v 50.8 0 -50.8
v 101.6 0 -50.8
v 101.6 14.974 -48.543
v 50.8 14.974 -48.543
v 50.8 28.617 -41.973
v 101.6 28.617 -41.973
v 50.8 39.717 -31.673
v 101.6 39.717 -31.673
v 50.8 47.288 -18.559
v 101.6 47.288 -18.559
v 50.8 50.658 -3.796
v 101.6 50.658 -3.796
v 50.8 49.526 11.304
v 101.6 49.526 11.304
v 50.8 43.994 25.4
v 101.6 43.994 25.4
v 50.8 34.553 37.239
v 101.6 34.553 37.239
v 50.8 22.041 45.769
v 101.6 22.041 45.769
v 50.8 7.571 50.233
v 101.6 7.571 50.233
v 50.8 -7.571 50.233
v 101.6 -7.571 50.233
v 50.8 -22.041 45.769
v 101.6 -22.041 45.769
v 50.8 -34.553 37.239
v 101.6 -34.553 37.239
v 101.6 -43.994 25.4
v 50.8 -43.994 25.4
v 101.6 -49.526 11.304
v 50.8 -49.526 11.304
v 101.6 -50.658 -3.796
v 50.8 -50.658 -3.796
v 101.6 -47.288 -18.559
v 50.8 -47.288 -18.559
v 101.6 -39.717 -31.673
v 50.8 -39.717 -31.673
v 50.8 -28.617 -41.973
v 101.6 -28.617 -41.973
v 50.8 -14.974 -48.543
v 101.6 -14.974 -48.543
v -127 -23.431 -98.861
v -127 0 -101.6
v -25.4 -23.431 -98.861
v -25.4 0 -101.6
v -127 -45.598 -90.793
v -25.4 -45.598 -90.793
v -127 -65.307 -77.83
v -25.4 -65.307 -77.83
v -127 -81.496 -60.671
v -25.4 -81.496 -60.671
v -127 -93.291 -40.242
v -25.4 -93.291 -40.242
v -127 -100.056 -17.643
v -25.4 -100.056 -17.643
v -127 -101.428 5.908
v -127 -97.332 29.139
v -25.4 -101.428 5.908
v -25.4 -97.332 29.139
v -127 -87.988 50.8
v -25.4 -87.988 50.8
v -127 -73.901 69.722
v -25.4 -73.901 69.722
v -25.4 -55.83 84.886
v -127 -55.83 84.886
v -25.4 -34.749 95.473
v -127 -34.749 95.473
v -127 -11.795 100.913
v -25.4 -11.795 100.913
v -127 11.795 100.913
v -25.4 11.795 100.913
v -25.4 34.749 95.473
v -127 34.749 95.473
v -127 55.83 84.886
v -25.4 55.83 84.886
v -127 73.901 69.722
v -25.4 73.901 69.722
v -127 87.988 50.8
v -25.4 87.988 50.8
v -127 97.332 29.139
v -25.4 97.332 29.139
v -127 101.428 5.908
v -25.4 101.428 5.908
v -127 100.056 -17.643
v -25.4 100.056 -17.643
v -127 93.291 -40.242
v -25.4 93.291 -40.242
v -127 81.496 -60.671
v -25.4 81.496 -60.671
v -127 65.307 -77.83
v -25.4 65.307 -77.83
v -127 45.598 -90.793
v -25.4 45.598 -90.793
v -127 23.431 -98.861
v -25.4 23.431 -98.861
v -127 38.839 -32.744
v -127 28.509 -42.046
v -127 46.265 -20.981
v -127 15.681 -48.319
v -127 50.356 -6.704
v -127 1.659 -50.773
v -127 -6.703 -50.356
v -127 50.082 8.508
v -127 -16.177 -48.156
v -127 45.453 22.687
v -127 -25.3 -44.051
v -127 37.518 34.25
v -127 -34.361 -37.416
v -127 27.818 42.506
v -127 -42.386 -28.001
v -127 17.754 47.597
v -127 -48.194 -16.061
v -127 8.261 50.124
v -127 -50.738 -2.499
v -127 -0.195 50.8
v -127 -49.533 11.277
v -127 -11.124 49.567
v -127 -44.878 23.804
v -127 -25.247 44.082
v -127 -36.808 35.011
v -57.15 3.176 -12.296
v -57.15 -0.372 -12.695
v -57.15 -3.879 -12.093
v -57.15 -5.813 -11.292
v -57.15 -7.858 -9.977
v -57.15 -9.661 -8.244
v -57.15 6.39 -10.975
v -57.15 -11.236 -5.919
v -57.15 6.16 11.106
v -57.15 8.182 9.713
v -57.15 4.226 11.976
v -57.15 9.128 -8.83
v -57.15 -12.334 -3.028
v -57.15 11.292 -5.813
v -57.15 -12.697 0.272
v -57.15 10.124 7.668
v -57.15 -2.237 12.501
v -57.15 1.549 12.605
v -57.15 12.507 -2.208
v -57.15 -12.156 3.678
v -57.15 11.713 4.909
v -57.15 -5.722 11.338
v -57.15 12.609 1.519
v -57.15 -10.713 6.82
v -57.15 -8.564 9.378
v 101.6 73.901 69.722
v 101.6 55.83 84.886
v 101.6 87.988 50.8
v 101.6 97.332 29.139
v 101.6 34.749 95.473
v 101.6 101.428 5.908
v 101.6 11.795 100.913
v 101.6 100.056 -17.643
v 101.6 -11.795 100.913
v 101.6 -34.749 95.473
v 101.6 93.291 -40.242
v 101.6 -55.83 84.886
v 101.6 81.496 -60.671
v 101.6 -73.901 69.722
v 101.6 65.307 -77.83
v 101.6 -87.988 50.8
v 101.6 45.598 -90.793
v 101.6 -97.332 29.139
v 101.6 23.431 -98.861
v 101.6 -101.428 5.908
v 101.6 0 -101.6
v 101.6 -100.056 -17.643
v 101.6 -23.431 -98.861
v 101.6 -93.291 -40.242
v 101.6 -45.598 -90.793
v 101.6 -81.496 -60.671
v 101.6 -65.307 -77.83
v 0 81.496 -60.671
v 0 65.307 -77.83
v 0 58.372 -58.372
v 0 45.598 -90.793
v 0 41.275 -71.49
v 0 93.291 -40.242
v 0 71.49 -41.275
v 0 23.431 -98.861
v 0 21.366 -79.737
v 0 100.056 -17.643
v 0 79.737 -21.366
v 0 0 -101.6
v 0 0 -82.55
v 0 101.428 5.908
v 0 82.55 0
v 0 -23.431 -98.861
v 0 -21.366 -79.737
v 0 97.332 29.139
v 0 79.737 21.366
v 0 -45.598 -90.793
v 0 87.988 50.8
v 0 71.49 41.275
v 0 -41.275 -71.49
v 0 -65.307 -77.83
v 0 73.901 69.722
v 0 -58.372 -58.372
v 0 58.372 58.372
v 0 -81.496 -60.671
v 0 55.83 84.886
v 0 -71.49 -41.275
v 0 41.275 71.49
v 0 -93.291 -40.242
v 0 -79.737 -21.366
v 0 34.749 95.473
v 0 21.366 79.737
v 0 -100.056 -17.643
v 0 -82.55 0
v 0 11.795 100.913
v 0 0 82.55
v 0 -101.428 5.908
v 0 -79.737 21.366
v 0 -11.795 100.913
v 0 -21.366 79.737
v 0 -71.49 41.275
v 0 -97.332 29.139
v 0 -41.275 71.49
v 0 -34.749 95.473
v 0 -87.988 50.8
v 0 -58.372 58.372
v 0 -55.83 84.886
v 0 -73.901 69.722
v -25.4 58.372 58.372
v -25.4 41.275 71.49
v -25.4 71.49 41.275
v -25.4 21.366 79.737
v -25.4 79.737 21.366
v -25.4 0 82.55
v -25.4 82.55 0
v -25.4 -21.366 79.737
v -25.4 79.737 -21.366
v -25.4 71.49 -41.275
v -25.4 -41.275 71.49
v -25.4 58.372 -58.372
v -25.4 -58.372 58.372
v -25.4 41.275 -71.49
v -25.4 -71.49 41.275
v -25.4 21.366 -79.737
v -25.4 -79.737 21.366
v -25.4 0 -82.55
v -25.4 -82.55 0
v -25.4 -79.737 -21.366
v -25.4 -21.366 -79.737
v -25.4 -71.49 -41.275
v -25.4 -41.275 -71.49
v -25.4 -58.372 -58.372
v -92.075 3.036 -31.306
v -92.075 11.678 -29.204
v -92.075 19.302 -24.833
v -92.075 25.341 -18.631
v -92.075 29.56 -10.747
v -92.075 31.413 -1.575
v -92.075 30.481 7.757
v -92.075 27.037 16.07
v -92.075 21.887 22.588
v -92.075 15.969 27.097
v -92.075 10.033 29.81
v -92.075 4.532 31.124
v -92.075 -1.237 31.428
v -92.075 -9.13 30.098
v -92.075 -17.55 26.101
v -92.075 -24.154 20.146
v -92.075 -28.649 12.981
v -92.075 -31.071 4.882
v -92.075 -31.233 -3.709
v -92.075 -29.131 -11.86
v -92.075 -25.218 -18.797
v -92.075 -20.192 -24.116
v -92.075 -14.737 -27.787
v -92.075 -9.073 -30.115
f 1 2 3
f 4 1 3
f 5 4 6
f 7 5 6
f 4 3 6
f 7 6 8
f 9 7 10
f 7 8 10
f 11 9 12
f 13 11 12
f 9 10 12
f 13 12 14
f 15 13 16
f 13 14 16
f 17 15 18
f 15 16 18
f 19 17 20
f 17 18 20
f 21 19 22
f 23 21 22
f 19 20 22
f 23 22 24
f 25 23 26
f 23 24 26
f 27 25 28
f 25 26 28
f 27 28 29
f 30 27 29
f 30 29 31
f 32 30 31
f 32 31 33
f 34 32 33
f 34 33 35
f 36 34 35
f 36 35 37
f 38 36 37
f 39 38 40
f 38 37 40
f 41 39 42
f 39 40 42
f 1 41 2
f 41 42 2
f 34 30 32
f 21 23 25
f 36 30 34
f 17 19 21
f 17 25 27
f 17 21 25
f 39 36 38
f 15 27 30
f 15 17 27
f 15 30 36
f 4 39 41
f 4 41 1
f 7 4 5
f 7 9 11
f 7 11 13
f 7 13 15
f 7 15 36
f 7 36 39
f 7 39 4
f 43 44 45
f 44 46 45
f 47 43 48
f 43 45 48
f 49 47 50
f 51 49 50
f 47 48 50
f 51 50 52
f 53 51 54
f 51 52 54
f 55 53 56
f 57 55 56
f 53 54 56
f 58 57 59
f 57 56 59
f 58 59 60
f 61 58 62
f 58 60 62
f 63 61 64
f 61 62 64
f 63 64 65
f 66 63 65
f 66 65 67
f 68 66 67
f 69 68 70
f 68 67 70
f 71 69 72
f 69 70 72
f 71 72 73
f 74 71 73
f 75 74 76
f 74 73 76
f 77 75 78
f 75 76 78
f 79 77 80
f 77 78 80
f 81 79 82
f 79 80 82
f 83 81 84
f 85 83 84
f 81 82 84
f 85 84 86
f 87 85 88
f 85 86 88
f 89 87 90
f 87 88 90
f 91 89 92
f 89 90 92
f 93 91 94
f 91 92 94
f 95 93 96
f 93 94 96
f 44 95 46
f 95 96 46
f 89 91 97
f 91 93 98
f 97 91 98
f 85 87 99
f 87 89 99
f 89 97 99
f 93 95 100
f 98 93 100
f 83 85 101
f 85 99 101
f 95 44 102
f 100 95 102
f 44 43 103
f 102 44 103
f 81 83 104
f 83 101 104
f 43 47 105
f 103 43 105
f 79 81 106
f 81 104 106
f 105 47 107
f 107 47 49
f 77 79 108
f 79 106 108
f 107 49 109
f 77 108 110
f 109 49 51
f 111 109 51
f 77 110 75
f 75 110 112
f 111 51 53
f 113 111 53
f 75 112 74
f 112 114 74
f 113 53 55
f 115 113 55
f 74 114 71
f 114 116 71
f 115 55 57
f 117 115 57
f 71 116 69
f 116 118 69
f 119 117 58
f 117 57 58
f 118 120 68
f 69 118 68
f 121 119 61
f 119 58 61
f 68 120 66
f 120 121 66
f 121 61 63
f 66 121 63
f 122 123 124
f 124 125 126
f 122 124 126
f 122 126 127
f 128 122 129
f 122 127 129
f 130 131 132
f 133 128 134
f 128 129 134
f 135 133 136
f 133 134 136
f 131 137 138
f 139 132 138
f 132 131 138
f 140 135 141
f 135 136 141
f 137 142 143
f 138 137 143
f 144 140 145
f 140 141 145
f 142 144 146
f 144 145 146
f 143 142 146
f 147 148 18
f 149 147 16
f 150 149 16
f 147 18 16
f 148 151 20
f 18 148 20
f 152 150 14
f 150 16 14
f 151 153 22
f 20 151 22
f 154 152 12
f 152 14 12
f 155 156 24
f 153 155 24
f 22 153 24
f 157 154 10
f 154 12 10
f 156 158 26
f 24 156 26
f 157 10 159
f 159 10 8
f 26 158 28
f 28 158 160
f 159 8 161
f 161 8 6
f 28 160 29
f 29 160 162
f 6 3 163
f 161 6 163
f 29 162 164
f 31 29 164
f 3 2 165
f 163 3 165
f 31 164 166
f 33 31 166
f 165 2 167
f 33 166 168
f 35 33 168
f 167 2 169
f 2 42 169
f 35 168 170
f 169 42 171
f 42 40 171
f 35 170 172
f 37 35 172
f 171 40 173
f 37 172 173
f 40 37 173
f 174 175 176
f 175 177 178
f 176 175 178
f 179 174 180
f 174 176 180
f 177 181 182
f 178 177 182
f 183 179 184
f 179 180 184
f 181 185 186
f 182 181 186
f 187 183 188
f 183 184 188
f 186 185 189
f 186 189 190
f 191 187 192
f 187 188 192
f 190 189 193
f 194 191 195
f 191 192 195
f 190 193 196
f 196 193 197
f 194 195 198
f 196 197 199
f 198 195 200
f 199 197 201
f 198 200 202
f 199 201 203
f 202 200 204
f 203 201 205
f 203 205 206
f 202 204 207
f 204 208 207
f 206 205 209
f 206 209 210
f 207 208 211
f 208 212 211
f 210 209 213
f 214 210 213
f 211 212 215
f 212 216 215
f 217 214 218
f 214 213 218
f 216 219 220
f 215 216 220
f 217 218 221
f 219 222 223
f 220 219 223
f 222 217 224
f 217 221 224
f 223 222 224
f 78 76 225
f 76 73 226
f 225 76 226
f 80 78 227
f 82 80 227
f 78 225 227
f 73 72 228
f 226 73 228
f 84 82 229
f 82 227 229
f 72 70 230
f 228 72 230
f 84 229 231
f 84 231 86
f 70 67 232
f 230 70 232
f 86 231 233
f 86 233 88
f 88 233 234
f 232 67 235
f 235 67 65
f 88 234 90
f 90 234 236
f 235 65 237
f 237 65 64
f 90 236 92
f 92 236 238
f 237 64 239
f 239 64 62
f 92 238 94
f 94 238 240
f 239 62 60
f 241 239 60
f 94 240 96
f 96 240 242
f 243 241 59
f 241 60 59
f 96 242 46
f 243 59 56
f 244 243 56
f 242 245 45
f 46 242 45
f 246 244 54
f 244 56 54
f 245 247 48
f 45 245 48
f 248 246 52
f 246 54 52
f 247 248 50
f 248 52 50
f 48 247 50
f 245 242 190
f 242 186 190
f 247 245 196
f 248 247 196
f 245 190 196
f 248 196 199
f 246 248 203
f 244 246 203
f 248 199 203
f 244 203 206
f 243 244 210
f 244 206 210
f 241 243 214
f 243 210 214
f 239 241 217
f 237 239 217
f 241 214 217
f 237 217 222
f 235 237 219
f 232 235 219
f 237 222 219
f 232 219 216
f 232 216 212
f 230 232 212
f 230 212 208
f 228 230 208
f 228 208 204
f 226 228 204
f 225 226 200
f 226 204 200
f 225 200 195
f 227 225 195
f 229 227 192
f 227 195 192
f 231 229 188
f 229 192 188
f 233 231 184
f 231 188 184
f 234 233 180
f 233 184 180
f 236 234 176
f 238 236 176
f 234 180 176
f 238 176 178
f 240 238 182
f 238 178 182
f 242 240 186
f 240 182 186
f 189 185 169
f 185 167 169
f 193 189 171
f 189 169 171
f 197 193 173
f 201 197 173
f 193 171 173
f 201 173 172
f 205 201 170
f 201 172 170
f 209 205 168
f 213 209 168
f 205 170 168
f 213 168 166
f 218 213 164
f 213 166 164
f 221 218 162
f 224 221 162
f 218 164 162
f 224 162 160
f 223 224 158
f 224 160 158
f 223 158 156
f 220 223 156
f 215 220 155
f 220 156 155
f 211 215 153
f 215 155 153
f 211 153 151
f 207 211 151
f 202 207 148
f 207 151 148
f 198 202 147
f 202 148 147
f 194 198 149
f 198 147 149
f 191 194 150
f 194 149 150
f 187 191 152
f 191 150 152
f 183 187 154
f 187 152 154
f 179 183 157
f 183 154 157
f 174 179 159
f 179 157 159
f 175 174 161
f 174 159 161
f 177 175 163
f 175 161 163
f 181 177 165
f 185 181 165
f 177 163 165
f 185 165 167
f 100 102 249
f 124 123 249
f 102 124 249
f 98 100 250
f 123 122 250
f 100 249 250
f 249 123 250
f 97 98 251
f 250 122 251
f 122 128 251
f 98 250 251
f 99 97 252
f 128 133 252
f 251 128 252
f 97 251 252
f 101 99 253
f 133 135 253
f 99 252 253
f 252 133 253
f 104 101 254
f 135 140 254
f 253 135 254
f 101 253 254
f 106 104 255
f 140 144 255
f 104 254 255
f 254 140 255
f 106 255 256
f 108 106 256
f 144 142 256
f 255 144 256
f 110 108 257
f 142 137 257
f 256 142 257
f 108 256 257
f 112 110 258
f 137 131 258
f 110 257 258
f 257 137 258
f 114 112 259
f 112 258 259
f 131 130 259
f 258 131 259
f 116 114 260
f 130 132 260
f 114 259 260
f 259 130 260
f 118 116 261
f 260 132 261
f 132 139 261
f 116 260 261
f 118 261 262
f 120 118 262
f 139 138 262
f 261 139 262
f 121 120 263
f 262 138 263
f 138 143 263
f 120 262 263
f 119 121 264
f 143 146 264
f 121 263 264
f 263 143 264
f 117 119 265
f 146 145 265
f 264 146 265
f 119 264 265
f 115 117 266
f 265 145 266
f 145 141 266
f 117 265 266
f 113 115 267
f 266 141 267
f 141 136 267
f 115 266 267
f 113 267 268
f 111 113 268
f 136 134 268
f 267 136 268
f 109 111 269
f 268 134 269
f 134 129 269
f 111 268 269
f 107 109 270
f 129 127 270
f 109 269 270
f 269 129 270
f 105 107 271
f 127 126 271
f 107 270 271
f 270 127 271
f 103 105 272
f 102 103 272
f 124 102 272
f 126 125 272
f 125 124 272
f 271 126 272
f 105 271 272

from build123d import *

# Parameters (mm, degrees)
SKETCH8_R          = 50.8
CUT_EXTRUDE3_DEPTH = 50.8


with BuildPart() as part:
    # Sketch1 → Revolve2 (revolve)
    with BuildSketch(Plane.XY, mode=Mode.PRIVATE) as revolve2_sk:
        Polygon((0, 101.6), (101.6, 101.6), (101.6, 0), (0, 0), (-25.4, 0), (-127, 0), (-127, 101.6), (-25.4, 101.6), (-25.4, 82.55), (0, 82.55), align=None)
    revolve(revolve2_sk.sketch.rotate(Axis((141.005607477, 0, 0), (-1, 0, 0)), 90), axis=Axis((141.005607477, 0, 0), (-1, 0, 0)))

    # Sketch8 → Cut-Extrude3 (cut)
    with BuildSketch(Plane(origin=(101.6, 0, 0), x_dir=(0, 0, -1), z_dir=(1, 0, 0))):
        Circle(SKETCH8_R)
    extrude(amount=-CUT_EXTRUDE3_DEPTH, mode=Mode.SUBTRACT)

    # Cut-Loft1: read off the stored shape, not the designer's step
    # Cut-Loft1: loft between two sections, ruled curve by curve
    cut_loft1_from = [
        Edge.make_bspline([(-127, 1.659470947, -50.772888003), (-127, 103.205246954, -47.453946108), (-127, 99.886305059, 54.091829898), (-127, -1.659470947, 50.772888003), (-127, -103.205246954, 47.453946108), (-127, -99.886305059, -54.091829898), (-127, 1.659470947, -50.772888003)], [0, 0, 0, 0, 0.5, 0.5, 0.5, 1, 1, 1, 1], 3, [1, 0.333333333, 0.333333333, 1, 0.333333333, 0.333333333, 1]),
    ]
    cut_loft1_to = [
        Edge.make_bspline([(-57.15, -3.878953486, -12.093126967), (-57.15, 20.307300449, -19.85103394), (-57.15, 28.065207421, 4.335219995), (-57.15, 3.878953486, 12.093126967), (-57.15, -20.307300449, 19.85103394), (-57.15, -28.065207421, -4.335219995), (-57.15, -3.878953486, -12.093126967)], [0, 0, 0, 0, 0.5, 0.5, 0.5, 1, 1, 1, 1], 3, [1, 0.333333333, 0.333333333, 1, 0.333333333, 0.333333333, 1]),
    ]
    cut_loft1 = Solid(Shell([*[Face.make_surface_from_curves(cut_loft1_from[k], cut_loft1_to[k]) for k in range(1)], Face(Wire(cut_loft1_from)), Face(Wire(cut_loft1_to))]))
    add(cut_loft1, mode=Mode.SUBTRACT)


solid = part.part
